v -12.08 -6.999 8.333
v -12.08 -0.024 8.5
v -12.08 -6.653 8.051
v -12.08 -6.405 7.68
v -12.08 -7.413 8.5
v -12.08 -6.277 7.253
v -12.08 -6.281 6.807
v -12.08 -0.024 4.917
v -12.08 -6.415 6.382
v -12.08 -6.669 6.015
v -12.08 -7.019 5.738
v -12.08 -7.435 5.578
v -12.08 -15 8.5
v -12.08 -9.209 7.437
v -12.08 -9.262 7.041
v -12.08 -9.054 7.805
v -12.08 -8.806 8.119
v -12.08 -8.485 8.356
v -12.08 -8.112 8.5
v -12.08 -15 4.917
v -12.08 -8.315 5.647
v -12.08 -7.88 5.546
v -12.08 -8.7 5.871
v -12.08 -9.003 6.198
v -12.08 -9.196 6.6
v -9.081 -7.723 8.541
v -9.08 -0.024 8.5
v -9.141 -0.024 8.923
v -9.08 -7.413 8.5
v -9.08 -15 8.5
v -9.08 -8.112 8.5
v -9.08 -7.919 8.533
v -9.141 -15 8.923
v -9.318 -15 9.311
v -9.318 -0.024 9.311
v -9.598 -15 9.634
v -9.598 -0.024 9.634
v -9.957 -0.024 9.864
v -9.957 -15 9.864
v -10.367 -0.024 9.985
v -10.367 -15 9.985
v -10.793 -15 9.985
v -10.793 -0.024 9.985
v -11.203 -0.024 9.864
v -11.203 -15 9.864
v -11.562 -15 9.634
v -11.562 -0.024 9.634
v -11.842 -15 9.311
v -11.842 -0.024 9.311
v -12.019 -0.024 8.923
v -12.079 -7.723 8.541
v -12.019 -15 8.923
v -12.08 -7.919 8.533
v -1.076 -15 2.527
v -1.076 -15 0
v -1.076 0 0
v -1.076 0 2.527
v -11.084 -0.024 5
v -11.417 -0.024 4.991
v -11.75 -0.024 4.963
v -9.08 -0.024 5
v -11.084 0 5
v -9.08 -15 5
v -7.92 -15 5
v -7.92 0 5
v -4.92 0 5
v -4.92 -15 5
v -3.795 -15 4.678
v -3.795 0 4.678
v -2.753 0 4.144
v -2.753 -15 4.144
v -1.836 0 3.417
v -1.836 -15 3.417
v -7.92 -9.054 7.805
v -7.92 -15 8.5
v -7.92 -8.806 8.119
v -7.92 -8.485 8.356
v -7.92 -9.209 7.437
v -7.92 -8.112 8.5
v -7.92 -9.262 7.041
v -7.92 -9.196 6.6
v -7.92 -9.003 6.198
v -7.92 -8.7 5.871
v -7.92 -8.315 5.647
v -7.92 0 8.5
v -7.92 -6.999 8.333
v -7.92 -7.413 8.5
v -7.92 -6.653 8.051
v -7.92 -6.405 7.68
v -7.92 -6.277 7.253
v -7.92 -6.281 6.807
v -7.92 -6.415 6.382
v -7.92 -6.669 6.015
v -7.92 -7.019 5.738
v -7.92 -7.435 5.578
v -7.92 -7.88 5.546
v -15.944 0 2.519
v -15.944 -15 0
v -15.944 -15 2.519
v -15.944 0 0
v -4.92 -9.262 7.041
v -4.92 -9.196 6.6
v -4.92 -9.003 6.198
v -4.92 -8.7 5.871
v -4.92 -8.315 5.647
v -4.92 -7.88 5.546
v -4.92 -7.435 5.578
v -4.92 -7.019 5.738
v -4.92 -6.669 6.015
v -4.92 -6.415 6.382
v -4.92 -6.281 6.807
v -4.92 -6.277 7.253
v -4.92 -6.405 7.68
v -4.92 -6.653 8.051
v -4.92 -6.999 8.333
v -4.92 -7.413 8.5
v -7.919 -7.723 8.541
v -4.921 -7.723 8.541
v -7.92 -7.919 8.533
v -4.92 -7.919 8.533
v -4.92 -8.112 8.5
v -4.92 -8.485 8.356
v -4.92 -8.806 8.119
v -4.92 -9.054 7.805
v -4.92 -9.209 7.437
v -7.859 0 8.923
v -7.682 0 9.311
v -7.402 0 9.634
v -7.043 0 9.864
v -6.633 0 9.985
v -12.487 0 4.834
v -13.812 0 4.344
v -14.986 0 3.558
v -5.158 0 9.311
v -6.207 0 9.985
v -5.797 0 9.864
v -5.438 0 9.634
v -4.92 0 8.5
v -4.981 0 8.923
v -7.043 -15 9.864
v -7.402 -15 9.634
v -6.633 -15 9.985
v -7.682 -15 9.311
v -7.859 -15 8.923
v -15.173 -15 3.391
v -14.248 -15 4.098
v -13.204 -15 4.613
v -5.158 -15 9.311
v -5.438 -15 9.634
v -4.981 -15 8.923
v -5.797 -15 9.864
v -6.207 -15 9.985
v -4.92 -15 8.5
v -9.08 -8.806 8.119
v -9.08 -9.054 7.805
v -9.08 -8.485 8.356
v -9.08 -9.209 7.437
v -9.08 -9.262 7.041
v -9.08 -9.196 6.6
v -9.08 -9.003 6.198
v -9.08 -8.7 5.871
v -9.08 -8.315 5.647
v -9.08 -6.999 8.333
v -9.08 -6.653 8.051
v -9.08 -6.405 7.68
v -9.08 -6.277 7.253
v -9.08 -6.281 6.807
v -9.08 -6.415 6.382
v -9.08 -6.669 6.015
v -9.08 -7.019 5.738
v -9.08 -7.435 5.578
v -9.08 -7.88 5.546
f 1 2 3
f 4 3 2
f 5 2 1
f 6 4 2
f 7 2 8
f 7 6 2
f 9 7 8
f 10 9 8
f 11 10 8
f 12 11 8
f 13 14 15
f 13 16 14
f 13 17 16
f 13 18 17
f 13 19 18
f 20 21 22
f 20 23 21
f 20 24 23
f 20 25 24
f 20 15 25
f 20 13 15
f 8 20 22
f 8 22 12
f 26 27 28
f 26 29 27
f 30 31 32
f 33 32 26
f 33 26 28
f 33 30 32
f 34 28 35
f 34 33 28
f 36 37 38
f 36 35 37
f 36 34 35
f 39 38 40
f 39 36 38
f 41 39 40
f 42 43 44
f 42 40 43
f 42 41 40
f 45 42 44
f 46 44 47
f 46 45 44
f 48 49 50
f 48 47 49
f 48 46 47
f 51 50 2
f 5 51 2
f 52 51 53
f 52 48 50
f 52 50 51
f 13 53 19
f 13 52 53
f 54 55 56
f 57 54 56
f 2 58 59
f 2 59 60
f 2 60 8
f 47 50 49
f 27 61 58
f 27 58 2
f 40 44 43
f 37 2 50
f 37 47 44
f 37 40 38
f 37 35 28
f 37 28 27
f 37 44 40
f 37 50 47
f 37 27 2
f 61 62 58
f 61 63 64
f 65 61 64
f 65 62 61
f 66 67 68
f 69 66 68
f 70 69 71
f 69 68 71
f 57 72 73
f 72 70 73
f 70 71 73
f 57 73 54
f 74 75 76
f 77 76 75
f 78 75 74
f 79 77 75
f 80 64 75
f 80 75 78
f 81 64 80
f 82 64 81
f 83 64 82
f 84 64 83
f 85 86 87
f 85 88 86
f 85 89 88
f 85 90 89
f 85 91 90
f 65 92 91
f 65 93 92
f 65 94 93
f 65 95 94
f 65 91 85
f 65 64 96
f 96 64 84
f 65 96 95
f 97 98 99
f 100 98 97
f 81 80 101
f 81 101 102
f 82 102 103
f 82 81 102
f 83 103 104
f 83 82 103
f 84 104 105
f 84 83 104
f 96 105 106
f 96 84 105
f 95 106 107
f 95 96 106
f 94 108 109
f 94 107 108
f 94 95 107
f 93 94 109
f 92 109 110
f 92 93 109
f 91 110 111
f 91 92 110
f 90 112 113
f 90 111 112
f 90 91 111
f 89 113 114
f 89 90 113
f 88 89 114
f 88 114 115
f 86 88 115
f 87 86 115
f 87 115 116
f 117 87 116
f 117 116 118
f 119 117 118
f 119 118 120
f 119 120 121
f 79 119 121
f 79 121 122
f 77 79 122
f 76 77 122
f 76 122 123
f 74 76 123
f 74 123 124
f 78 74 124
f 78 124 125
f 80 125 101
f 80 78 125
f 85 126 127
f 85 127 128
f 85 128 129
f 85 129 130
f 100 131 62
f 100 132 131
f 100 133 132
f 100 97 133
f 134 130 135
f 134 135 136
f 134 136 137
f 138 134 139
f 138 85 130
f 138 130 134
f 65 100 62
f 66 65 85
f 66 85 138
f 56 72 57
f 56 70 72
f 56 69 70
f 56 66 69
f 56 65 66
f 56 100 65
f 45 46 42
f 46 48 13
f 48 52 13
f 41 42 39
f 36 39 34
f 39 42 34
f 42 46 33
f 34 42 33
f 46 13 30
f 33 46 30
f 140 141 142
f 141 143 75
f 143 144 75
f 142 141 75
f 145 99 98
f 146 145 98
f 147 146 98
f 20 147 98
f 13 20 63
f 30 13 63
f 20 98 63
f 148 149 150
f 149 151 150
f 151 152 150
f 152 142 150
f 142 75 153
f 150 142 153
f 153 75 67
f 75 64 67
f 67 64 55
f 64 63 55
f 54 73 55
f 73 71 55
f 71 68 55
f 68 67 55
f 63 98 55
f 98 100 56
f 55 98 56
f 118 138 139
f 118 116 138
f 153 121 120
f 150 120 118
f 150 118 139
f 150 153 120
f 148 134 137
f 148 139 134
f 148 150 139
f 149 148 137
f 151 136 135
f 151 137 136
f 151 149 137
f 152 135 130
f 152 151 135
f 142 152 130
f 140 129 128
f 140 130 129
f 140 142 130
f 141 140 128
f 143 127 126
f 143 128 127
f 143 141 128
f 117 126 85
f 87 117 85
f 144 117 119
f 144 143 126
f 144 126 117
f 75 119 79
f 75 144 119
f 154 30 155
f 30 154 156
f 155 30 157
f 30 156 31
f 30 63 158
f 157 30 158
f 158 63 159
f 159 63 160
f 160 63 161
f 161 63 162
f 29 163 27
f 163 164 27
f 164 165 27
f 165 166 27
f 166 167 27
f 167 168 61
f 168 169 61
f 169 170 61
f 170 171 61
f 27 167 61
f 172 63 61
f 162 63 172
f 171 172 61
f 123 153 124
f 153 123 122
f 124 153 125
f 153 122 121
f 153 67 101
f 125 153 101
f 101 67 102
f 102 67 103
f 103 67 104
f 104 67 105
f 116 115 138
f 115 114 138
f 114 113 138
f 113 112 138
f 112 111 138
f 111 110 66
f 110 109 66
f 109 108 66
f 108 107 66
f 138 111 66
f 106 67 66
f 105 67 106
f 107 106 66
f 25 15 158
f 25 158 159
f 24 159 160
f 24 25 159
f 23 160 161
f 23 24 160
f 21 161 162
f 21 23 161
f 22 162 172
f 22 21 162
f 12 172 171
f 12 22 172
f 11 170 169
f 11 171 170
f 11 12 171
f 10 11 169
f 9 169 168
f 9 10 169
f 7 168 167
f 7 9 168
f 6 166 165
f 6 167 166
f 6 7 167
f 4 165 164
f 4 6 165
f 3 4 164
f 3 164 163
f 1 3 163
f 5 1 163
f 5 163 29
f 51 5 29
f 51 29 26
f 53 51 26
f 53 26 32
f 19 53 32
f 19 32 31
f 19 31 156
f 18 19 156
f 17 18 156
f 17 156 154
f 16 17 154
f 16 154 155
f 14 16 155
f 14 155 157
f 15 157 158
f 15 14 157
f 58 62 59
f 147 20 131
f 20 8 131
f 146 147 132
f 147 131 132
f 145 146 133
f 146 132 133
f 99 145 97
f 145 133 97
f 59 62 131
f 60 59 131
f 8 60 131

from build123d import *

# Parameters (mm, degrees)
SKETCH1_W               = 17
SKETCH1_H               = 15
BOSS_EXTRUDE1_DEPTH     = 5
SKETCH2_W               = 3
SKETCH2_H               = 15
SKETCH2_H_2             = 14.97636143
BOSS_EXTRUDE2_DEPTH     = 5
CUT_EXTRUDE2_DEPTH      = 21.185301583
CUT_EXTRUDE2_DEPTH_BACK = 21.185301583
SKETCH4_R               = 1.5
FILLET1_R               = 6
FILLET3_RADIUS          = 1.5
FILLET3_LENGTH          = 14.97636143
FILLET4_RADIUS          = 1.5
FILLET4_LENGTH          = 15
SKETCH5_W               = 1.007967197
SKETCH5_H               = 15
SKETCH5_W_2             = 1.056413299
CUT_EXTRUDE4_DEPTH      = 10


with BuildPart() as part:
    # Sketch1 → Boss-Extrude1 (new body)
    with BuildSketch(Plane.XY):
        with Locations((-8.5, -7.5)):
            Rectangle(SKETCH1_W, SKETCH1_H)
    extrude(amount=BOSS_EXTRUDE1_DEPTH)

    # Sketch2 → Boss-Extrude2 (add)
    with BuildSketch(Plane.XY.offset(5)):
        with Locations((-6.42, -7.5)):
            Rectangle(SKETCH2_W, SKETCH2_H)
        with Locations((-10.58, -7.511819285)):
            Rectangle(SKETCH2_W, SKETCH2_H_2)
    extrude(amount=BOSS_EXTRUDE2_DEPTH)

    # Sketch4 → Cut-Extrude2 (cut, two sides: drawn at the far end of the back side and taken through both)
    with BuildSketch(Plane(origin=(-9.08, 0, 0), x_dir=(0, 0, -1), z_dir=(1, 0, 0)).offset(-CUT_EXTRUDE2_DEPTH_BACK)):
        with Locations(Location((-7.041389116, -7.762480296, 0), (0, 0, 270))):
            Circle(SKETCH4_R)
    extrude(amount=CUT_EXTRUDE2_DEPTH + CUT_EXTRUDE2_DEPTH_BACK, mode=Mode.SUBTRACT)

    # Fillet1
    # the kernel refuses this fillet: 6 mm, written as the material it takes off along each edge
    with BuildSketch(Plane(origin=(0, -29.754999153, 5), x_dir=(0, 0, -1), z_dir=(0, 1, 0))) as fillet1_piece_1:
        with BuildLine():
            CenterArc((5.901999661, 6), FILLET1_R, 190.369759805, 79.630240195)
            Line((0, 4.92), (0, 0))
            Line((0, 0), (5.901999661, 0))
        make_face()
    extrude(amount=44.509998306, mode=Mode.SUBTRACT)
    # the kernel refuses this fillet: 6 mm, written as the material it takes off along each edge
    with BuildSketch(Plane(origin=(-17, 14.790199458, 5), x_dir=(0, 0, -1), z_dir=(0, -1, 0))) as fillet1_2_piece_1_section:
        with BuildLine():
            CenterArc((6, 5.916079783), FILLET1_R, 180, 80.405931773)
            Line((0, 5.916079783), (0, 0))
            Line((0, 0), (5, 0))
        make_face()
    fillet1_2_piece_1 = extrude(amount=44.580398916, mode=Mode.PRIVATE)
    fillet1_2_piece_1 = split(fillet1_2_piece_1, bisect_by=Plane(origin=(-17, -0.02363857, 5), z_dir=(0, 1, 0)), keep=Keep.TOP, mode=Mode.PRIVATE)
    fillet1_2_piece_1 = split(fillet1_2_piece_1, bisect_by=Plane(origin=(-12.08, 14.790199458, 5), z_dir=(-1, 0, 0)), keep=Keep.TOP, mode=Mode.PRIVATE)
    add(fillet1_2_piece_1, mode=Mode.SUBTRACT)
    with BuildSketch(Plane(origin=(-17, 14.790199458, 5), x_dir=(0, 0, -1), z_dir=(0, -1, 0))) as fillet1_2_piece_2_section:
        with BuildLine():
            CenterArc((6, 5.916079783), FILLET1_R, 180, 80.405931773)
            Line((0, 5.916079783), (0, 0))
            Line((0, 0), (5, 0))
        make_face()
    fillet1_2_piece_2 = extrude(amount=44.580398916, mode=Mode.PRIVATE)
    fillet1_2_piece_2 = split(fillet1_2_piece_2, bisect_by=Plane(origin=(-17, -0.02363857, 5), z_dir=(0, 1, 0)), keep=Keep.TOP, mode=Mode.PRIVATE)
    fillet1_2_piece_2 = split(fillet1_2_piece_2, bisect_by=Plane(origin=(-12.08, 14.790199458, 5), z_dir=(1, 0, 0)), keep=Keep.TOP, mode=Mode.PRIVATE)
    add(fillet1_2_piece_2, mode=Mode.SUBTRACT)
    with BuildSketch(Plane(origin=(-17, 14.790199458, 5), x_dir=(0, 0, -1), z_dir=(0, -1, 0))) as fillet1_2_piece_3_section:
        with BuildLine():
            CenterArc((6, 5.916079783), FILLET1_R, 180, 80.405931773)
            Line((0, 5.916079783), (0, 0))
            Line((0, 0), (5, 0))
        make_face()
    fillet1_2_piece_3 = extrude(amount=44.580398916, mode=Mode.PRIVATE)
    fillet1_2_piece_3 = split(fillet1_2_piece_3, bisect_by=Plane(origin=(-17, -0.02363857, 5), z_dir=(0, -1, 0)), keep=Keep.TOP, mode=Mode.PRIVATE)
    fillet1_2_piece_3 = split(fillet1_2_piece_3, bisect_by=Plane(origin=(-12.08, 14.790199458, 5), z_dir=(-1, 0, 0)), keep=Keep.TOP, mode=Mode.PRIVATE)
    add(fillet1_2_piece_3, mode=Mode.SUBTRACT)

    # Fillet3: full round fillet: the end face becomes a half cylinder, R = half its width
    fillet3_face = Plane((-10.58, -7.511819285, 10), x_dir=(0, -1, 0), z_dir=(0, 0, 1))  # on the end face: x along it, z out of the body
    fillet3_slab = fillet3_face.offset(-FILLET3_RADIUS / 2) * Box(FILLET3_LENGTH, 2 * FILLET3_RADIUS, FILLET3_RADIUS, mode=Mode.PRIVATE)  # the body's end, R deep
    fillet3_round = Plane((-10.58, -7.511819285, 8.5), x_dir=(0, 0, 1), z_dir=(0, -1, 0)) * Cylinder(FILLET3_RADIUS, FILLET3_LENGTH, mode=Mode.PRIVATE)  # its axis R under the face
    add(fillet3_slab - fillet3_round, mode=Mode.SUBTRACT)

    # Fillet4: full round fillet: the end face becomes a half cylinder, R = half its width
    fillet4_face = Plane((-6.42, -7.5, 10), x_dir=(0, -1, 0), z_dir=(0, 0, 1))  # on the end face: x along it, z out of the body
    fillet4_slab = fillet4_face.offset(-FILLET4_RADIUS / 2) * Box(FILLET4_LENGTH, 2 * FILLET4_RADIUS, FILLET4_RADIUS, mode=Mode.PRIVATE)  # the body's end, R deep
    fillet4_round = Plane((-6.42, -7.5, 8.5), x_dir=(0, 0, 1), z_dir=(0, -1, 0)) * Cylinder(FILLET4_RADIUS, FILLET4_LENGTH, mode=Mode.PRIVATE)  # its axis R under the face
    add(fillet4_slab - fillet4_round, mode=Mode.SUBTRACT)

    # Sketch5 → Cut-Extrude4 (cut)
    with BuildSketch(Plane.XY):
        with Locations((-0.572171345, -7.5)):
            Rectangle(SKETCH5_W, SKETCH5_H)
        with Locations((-16.471793351, -7.5)):
            Rectangle(SKETCH5_W_2, SKETCH5_H)
    extrude(amount=CUT_EXTRUDE4_DEPTH, mode=Mode.SUBTRACT)


solid = part.part
